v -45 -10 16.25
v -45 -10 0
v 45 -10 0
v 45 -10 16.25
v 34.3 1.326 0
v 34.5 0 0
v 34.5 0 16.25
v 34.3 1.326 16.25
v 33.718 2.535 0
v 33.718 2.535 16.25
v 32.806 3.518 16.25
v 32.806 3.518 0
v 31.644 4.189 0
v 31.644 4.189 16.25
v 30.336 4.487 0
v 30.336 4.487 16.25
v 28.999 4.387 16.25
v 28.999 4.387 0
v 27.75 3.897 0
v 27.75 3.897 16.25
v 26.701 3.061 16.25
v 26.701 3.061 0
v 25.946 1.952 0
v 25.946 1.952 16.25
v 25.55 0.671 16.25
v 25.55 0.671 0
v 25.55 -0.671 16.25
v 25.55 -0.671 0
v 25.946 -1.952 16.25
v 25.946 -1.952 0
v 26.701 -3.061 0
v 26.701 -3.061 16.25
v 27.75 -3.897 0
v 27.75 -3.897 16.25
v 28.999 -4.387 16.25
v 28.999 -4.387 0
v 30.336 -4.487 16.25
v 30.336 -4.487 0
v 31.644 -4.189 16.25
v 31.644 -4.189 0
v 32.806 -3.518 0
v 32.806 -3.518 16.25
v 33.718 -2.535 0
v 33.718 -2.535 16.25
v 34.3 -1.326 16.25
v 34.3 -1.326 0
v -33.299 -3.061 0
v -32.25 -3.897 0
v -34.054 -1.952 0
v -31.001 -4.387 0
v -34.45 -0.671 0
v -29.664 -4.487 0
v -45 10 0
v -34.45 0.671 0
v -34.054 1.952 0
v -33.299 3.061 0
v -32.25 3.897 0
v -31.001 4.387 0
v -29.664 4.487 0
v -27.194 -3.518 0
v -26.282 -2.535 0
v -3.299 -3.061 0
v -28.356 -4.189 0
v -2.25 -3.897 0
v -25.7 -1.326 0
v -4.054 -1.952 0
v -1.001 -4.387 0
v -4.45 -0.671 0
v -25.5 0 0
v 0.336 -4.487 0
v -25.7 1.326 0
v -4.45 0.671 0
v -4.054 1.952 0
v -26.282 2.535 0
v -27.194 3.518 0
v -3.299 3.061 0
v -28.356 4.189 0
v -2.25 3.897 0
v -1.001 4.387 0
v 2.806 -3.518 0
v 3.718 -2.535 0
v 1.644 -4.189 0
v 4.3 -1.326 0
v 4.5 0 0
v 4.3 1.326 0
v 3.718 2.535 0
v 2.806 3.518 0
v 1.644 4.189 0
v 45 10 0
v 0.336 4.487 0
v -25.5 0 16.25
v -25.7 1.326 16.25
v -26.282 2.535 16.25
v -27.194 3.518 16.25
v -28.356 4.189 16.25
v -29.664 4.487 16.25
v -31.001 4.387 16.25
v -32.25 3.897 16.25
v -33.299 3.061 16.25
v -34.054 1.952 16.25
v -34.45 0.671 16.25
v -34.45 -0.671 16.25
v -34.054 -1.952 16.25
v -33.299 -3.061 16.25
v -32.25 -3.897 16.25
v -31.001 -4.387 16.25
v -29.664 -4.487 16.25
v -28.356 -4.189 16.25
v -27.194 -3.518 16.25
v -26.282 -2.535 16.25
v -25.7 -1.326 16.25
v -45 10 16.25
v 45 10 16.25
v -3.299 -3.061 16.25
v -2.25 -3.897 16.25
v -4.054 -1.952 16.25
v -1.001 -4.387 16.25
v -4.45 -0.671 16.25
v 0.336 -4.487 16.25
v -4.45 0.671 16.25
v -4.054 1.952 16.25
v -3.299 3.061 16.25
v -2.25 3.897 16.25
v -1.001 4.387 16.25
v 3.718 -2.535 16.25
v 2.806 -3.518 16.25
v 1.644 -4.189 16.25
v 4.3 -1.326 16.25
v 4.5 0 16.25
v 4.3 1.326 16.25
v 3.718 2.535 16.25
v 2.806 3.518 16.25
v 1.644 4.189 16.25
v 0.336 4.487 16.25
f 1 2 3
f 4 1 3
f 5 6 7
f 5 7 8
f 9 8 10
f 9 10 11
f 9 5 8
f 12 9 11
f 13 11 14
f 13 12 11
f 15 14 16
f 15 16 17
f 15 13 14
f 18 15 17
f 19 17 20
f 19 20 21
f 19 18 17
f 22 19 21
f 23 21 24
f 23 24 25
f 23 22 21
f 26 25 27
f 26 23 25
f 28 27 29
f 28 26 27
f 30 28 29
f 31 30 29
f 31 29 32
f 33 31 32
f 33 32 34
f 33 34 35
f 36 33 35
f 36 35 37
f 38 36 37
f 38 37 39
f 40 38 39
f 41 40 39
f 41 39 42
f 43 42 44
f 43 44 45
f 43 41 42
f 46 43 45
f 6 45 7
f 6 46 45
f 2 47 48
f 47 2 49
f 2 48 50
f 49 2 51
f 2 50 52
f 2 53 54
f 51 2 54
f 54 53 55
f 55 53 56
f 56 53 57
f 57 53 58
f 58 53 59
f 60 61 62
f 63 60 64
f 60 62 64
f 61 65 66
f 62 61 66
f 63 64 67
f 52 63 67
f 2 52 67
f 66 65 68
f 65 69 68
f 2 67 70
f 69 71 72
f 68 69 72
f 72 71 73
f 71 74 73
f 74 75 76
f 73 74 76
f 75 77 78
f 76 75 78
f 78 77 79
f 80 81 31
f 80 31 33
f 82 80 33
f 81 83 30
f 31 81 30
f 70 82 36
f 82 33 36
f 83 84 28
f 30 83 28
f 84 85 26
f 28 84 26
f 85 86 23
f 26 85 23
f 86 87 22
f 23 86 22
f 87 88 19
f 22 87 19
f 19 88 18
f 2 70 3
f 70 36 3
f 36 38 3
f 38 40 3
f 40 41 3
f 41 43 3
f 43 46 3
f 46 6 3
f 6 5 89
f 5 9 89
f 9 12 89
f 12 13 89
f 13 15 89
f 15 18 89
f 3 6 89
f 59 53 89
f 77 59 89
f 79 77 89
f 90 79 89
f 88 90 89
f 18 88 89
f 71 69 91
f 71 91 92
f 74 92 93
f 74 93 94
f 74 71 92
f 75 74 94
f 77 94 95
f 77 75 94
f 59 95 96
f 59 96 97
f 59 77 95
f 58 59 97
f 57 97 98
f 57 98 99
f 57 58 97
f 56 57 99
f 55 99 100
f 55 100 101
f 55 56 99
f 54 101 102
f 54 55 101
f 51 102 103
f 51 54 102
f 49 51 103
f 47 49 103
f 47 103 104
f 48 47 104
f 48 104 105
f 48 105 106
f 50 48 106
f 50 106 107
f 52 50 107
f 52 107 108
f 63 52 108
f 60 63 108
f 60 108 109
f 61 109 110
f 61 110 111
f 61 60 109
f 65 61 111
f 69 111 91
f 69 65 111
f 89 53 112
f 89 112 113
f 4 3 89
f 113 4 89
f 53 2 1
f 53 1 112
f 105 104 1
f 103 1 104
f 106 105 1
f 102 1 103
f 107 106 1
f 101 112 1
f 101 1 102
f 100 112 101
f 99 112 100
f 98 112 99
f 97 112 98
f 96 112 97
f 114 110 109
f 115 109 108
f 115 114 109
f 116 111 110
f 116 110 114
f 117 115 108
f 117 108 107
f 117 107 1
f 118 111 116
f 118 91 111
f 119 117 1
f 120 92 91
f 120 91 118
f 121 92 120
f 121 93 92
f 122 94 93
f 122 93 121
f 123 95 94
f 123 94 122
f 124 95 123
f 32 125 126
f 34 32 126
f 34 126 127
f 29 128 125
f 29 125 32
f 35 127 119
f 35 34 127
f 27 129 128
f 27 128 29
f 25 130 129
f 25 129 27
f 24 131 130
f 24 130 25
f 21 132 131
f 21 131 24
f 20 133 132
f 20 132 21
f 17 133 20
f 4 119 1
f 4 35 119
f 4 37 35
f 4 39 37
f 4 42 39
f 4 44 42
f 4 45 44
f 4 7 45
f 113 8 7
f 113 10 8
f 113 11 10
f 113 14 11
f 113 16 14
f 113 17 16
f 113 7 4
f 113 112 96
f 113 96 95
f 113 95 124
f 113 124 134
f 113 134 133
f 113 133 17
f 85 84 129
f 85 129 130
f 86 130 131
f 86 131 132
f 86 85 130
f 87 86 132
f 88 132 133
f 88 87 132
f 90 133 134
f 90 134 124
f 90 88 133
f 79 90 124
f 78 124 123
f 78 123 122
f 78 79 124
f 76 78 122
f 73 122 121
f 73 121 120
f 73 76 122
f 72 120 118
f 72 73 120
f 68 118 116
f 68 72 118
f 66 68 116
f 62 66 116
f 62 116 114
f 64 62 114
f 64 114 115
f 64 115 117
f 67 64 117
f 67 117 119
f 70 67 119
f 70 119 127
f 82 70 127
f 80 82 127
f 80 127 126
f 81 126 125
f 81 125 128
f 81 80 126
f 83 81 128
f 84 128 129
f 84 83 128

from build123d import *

# Parameters (mm, degrees)
SKETCH_1_W      = 90
SKETCH_1_H      = 20
SKETCH_1_R      = 4.5
EXTRUDE_1_DEPTH = 16.25


with BuildPart() as part:
    # 草图1 → 凸台-拉伸1 (new body)
    with BuildSketch(Plane.XY):
        Rectangle(SKETCH_1_W, SKETCH_1_H)
        with Locations((-30, 0)):
            Circle(SKETCH_1_R, mode=Mode.SUBTRACT)
        Circle(SKETCH_1_R, mode=Mode.SUBTRACT)
        with Locations((30, 0)):
            Circle(SKETCH_1_R, mode=Mode.SUBTRACT)
    extrude(amount=EXTRUDE_1_DEPTH)


solid = part.part
